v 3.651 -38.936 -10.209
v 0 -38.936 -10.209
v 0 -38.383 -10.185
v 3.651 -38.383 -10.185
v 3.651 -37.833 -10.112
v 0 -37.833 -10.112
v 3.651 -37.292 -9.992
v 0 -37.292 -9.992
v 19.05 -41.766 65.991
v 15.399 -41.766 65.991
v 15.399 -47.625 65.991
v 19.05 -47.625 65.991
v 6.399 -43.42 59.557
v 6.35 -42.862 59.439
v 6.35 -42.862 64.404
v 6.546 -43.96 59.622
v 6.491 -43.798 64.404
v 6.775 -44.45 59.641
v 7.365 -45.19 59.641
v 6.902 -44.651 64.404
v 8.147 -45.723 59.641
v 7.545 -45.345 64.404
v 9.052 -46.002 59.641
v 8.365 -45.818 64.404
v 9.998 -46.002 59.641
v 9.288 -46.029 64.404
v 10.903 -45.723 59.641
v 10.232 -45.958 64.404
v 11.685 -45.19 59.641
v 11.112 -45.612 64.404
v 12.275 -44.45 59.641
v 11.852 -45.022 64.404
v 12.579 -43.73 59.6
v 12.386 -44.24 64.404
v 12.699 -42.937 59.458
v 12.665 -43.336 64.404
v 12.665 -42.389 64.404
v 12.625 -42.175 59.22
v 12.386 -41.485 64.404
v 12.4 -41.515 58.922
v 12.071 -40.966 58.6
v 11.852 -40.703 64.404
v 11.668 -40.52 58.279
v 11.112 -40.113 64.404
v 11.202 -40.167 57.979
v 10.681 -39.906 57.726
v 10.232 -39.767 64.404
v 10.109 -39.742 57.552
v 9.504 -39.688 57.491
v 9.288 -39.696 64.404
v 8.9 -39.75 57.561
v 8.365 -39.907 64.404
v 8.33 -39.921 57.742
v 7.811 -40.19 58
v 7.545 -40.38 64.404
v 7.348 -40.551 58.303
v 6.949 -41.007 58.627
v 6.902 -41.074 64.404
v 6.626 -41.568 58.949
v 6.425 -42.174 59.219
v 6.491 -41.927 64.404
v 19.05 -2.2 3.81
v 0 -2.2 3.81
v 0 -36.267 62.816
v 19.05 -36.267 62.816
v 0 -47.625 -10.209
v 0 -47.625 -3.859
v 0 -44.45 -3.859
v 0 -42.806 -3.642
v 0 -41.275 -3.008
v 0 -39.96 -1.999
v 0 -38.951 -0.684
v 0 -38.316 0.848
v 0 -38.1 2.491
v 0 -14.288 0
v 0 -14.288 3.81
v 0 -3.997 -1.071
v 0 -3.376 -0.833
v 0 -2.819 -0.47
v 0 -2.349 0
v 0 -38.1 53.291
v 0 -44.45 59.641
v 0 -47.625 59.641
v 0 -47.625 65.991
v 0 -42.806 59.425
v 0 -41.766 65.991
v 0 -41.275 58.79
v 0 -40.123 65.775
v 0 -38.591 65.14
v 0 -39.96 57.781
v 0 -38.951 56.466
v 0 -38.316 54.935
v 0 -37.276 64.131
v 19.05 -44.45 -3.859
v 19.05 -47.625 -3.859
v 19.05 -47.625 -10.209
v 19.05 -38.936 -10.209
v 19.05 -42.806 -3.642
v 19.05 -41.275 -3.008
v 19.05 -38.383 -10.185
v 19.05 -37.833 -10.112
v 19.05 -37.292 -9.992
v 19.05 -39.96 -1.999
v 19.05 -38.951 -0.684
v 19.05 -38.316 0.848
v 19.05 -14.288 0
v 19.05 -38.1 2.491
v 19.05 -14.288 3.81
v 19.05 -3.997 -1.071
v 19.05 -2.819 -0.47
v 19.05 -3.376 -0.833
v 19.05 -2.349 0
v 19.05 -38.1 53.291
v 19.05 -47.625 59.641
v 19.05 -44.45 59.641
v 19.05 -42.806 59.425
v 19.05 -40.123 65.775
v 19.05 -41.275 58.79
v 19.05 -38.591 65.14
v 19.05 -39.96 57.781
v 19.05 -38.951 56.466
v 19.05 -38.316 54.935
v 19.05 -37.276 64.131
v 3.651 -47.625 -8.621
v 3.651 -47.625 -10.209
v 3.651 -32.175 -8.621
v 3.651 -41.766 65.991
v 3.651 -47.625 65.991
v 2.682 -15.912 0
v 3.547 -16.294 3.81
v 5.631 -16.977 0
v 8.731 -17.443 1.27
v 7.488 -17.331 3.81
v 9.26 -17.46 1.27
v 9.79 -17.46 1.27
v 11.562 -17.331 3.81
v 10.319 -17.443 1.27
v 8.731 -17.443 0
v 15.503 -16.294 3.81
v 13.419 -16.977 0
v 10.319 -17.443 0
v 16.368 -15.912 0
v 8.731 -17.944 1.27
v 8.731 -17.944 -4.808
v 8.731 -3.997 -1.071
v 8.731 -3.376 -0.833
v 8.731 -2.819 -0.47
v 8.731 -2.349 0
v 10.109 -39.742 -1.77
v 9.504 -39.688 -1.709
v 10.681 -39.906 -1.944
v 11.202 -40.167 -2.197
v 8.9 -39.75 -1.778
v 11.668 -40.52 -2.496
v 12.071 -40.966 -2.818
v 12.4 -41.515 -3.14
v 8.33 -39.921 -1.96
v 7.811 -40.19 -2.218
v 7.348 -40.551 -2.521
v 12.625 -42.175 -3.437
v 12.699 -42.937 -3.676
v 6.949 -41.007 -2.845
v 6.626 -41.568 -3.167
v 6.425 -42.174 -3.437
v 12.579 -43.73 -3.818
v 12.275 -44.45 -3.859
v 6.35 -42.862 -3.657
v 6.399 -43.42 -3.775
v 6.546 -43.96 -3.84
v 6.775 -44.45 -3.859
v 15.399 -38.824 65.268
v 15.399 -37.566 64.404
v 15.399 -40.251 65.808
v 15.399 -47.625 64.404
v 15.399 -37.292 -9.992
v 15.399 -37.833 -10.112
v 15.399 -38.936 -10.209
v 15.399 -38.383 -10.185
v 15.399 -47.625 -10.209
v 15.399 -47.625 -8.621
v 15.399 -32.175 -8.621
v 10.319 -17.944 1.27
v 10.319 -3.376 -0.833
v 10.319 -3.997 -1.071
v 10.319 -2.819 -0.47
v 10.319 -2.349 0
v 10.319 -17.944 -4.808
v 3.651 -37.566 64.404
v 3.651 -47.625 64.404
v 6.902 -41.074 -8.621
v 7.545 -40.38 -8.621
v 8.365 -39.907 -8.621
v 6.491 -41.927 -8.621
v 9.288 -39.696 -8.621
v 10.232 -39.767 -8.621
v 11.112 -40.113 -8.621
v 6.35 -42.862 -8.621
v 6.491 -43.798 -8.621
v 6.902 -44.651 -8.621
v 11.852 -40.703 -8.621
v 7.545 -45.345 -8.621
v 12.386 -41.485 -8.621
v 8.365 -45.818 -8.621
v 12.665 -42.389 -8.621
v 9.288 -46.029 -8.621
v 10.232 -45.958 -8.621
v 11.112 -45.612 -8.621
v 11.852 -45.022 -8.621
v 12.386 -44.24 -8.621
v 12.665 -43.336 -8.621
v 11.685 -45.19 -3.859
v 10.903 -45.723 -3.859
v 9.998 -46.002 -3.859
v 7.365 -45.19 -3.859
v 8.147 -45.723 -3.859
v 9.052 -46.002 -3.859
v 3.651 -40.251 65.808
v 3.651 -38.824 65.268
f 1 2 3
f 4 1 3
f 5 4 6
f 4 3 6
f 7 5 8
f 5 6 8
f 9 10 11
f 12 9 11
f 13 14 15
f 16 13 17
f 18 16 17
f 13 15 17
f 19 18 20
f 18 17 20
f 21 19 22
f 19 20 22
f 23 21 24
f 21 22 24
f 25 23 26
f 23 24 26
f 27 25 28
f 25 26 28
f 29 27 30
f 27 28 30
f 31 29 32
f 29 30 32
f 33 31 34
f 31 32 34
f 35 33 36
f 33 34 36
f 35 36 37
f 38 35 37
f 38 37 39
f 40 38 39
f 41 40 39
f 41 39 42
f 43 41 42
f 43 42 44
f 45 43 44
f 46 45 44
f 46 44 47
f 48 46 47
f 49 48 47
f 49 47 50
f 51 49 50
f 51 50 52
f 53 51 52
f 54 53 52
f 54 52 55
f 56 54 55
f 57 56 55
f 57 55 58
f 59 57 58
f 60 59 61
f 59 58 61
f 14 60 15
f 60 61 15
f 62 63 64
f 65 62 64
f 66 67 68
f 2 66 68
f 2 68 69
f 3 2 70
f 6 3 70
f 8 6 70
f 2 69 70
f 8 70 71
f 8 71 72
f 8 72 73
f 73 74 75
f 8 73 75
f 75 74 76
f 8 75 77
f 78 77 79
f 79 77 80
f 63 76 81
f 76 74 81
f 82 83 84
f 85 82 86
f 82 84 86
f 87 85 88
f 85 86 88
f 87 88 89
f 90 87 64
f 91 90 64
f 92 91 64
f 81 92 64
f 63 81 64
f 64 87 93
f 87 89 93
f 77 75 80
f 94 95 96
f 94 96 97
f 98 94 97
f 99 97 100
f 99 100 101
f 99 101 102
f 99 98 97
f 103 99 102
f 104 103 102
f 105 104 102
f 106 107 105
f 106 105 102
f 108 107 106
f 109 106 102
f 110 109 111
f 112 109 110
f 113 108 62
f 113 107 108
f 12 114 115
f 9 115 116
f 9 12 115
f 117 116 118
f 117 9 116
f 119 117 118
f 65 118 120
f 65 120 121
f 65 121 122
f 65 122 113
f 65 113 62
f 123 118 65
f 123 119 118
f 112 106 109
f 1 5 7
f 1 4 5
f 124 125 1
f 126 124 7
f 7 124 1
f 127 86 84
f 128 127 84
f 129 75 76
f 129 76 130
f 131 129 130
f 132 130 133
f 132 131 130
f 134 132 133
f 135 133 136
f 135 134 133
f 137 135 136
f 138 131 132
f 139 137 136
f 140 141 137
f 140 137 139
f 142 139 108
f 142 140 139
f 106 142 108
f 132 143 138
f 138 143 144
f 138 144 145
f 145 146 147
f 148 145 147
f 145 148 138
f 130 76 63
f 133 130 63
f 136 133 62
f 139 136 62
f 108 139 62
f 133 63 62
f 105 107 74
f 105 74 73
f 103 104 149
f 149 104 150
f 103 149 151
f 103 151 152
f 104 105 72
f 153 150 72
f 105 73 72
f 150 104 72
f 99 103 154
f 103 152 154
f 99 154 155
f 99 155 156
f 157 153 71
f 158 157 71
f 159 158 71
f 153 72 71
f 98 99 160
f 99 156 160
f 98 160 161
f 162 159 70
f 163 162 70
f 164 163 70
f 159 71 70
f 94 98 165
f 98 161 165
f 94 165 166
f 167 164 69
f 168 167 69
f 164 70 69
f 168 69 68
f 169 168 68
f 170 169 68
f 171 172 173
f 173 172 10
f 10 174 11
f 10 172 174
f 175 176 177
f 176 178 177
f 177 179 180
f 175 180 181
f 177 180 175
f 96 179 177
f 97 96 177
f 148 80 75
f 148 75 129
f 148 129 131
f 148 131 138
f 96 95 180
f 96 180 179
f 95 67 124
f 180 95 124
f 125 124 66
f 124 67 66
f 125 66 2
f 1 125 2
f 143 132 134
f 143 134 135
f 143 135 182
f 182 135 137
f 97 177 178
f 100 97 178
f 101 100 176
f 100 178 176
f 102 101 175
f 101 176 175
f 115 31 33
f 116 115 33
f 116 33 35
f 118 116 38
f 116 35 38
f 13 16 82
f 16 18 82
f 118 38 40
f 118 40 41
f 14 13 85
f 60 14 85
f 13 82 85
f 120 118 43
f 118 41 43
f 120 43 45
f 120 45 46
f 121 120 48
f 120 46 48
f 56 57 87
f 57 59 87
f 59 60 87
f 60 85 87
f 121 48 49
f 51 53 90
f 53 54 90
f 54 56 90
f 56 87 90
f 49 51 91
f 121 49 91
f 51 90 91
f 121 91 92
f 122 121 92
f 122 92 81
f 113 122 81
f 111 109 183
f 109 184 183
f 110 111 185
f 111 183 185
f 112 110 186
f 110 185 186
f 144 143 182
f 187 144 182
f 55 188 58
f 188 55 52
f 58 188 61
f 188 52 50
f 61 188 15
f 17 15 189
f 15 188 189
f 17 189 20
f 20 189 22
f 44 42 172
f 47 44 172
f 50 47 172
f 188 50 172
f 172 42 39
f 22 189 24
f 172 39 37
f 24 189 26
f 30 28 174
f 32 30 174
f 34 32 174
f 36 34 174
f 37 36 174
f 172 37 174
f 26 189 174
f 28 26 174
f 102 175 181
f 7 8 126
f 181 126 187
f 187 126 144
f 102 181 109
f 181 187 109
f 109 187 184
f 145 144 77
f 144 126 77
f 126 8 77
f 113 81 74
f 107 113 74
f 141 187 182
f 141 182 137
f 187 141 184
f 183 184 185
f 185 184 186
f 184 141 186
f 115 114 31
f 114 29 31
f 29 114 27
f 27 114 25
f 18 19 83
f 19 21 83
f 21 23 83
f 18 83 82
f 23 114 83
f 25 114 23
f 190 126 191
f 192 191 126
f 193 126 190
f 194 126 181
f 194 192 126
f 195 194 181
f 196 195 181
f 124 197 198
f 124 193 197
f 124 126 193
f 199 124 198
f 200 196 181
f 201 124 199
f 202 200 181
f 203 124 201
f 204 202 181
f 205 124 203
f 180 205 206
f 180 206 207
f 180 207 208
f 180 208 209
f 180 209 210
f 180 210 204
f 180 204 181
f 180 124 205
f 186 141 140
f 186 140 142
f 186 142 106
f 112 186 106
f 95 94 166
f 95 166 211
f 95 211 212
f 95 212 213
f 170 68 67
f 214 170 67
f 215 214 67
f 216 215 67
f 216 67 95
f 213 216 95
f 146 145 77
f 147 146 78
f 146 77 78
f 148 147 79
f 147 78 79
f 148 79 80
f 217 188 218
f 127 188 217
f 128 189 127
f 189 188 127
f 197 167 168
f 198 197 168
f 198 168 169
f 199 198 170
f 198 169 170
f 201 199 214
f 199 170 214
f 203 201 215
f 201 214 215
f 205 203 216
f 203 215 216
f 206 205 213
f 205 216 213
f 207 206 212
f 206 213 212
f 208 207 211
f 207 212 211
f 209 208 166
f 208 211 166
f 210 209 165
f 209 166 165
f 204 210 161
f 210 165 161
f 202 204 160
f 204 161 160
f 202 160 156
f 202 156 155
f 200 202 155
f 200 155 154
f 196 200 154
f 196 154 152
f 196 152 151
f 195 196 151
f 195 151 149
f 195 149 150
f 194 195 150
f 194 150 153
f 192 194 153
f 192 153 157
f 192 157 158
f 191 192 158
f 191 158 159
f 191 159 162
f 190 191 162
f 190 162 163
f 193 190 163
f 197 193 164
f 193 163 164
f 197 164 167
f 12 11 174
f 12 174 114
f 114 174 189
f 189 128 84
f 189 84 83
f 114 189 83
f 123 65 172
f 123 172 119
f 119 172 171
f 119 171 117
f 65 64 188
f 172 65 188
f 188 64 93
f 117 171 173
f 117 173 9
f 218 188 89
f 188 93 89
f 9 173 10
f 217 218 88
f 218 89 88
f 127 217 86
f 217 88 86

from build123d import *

# Parameters (mm, degrees)
F1_DEPTH      = 19.05
F3_D          = 6.35
F4_W          = 1.5875
F4_H          = 35.8877405588
F5_DEPTH      = 25.4
F5_DEPTH_BACK = 1.27
F6_R          = 15.875
F7_DEPTH      = 3.81
F8_W          = 11.7475
F8_H          = 3.175
F9_DEPTH      = 25.4
F10_W         = 11.7475
F10_H         = 3.175
F11_DEPTH     = 25.4


with BuildPart() as f1:
    # F0 (on Right) → F1 (new body)
    with BuildSketch(Plane.YZ):
        with BuildLine():
            ThreePointArc((-3.9967504682, -1.0709260603), (-1.8851834207, 0.7808685404), (-2.0688702794, 3.5833884382))
            Line((-2.0688702794, 3.5833884382), (-36.2669128953, 62.8161357684))
            ThreePointArc((-36.2669128953, 62.8161357684), (-38.5911742094, 65.1403970824), (-41.7661742094, 65.9911357684))
            Line((-41.7661742094, 65.9911357684), (-47.625, 65.9911357684))
            Line((-47.625, 65.9911357684), (-47.625, 59.6411357684))
            Line((-47.625, 59.6411357684), (-44.45, 59.6411357684))
            ThreePointArc((-44.45, 59.6411357684), (-39.9598719395, 57.7812638289), (-38.1, 53.2911357684))
            Line((-38.1, 53.2911357684), (-38.1, 2.4911357684))
            ThreePointArc((-38.1, 2.4911357684), (-39.9598719395, -1.9989922922), (-44.45, -3.8588642316))
            Line((-44.45, -3.8588642316), (-47.625, -3.8588642316))
            Line((-47.625, -3.8588642316), (-47.625, -10.2088642316))
            Line((-47.625, -10.2088642316), (-38.9359933597, -10.2088642316))
            ThreePointArc((-38.9359933597, -10.2088642316), (-38.1071520391, -10.1545391013), (-37.2924924233, -9.9924932286))
            Line((-37.2924924233, -9.9924932286), (-3.9967504682, -1.0709260603))
        make_face()
    extrude(amount=F1_DEPTH)

    # F3 (through all)
    with Locations(Plane(origin=(0, 0, -10.2088642316), x_dir=(1, 0, 0), z_dir=(0, 0, -1))):
        with Locations((9.525, 42.8625)):
            Hole(F3_D / 2)

    # F4 (on Top) → F5 (cut, two sides)
    with BuildSketch(Plane.XY) as f5_sk:
        with Locations((9.525, 0)):
            Rectangle(F4_W, F4_H)
    extrude(amount=-F5_DEPTH, mode=Mode.SUBTRACT)
    extrude(f5_sk.sketch, amount=F5_DEPTH_BACK, mode=Mode.SUBTRACT)

    # F6 (on Top) → F7 (cut)
    with BuildSketch(Plane.XY):
        with Locations((9.525, -1.5875)):
            Circle(F6_R)
    extrude(amount=F7_DEPTH, mode=Mode.SUBTRACT)

    # F8 (on face) → F9 (cut)
    with BuildSketch(Plane.XZ.offset(47.625)):
        with Locations((9.525, 65.9911357684)):
            Rectangle(F8_W, F8_H)
    extrude(amount=-F9_DEPTH, mode=Mode.SUBTRACT)

    # F10 (on face) → F11 (cut)
    with BuildSketch(Plane.XZ.offset(47.625)):
        with Locations((9.525, -10.2088642316)):
            Rectangle(F10_W, F10_H)
    extrude(amount=-F11_DEPTH, mode=Mode.SUBTRACT)


solid = f1.part
